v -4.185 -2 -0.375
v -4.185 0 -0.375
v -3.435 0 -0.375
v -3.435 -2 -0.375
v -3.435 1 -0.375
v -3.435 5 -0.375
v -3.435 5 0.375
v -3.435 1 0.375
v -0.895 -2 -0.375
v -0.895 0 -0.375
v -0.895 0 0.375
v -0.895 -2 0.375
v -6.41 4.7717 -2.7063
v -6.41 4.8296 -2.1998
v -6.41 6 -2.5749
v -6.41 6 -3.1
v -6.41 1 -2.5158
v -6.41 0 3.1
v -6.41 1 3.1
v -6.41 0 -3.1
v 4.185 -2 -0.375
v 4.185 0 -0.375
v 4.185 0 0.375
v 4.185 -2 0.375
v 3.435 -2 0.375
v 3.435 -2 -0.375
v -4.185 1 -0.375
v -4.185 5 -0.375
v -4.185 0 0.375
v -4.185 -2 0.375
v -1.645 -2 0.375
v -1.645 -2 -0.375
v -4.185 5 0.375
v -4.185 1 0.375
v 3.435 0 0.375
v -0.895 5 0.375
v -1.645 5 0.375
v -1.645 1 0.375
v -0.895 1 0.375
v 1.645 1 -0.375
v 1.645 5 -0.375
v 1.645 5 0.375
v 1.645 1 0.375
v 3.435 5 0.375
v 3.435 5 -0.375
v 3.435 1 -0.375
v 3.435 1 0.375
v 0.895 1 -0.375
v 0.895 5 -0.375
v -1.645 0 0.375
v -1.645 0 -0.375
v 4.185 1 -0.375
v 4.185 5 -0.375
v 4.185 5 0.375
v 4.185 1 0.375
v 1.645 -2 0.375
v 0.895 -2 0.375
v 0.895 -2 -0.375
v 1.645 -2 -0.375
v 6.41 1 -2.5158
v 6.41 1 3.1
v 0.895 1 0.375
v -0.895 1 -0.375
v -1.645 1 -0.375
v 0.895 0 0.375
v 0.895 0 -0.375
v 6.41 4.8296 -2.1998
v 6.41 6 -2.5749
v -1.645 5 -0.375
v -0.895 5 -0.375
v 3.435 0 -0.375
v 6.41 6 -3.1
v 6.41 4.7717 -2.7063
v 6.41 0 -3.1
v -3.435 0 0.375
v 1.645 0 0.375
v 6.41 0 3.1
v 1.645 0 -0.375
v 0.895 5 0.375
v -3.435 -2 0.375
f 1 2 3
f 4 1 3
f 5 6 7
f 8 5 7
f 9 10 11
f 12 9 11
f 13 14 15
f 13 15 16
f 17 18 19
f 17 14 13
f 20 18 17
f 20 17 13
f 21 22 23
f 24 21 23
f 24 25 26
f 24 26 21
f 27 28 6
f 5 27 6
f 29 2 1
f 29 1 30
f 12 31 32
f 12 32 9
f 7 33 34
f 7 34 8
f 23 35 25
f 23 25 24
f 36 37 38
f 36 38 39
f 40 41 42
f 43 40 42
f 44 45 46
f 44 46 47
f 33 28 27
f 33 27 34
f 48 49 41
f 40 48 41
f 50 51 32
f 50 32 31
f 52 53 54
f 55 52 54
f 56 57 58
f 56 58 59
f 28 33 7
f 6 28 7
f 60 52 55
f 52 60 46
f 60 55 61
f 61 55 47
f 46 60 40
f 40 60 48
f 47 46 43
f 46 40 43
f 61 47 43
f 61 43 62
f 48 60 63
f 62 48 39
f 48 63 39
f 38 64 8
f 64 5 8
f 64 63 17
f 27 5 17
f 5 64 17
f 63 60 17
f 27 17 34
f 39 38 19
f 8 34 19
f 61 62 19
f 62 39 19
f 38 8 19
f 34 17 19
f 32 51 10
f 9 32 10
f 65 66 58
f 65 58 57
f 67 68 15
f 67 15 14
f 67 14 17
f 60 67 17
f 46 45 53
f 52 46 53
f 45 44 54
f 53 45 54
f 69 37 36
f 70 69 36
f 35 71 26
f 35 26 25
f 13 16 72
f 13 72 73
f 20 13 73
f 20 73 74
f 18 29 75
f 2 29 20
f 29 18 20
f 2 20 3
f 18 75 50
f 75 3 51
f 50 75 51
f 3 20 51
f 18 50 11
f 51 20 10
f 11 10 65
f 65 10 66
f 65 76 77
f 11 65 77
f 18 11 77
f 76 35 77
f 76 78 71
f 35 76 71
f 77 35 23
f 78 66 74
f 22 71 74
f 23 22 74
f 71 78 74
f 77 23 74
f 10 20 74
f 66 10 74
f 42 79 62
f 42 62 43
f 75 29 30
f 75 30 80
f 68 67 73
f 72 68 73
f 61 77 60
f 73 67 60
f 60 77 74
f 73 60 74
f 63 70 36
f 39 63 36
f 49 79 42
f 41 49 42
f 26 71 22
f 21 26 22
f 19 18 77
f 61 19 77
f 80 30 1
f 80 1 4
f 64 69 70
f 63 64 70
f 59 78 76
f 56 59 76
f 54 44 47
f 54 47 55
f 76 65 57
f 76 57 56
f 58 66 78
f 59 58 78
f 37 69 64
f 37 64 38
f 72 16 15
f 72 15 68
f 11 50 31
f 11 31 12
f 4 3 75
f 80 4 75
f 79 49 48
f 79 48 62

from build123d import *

# Parameters (mm, degrees)
SKETCH_1_W           = 12.82
SKETCH_1_H           = 6.2
EXTRUDE_1_DEPTH      = 6
SKETCH_2_W           = 12.82
SKETCH_2_H           = 5.2
CUT_EXTRUDE_1_DEPTH  = 5
CUT_EXTRUDE_2_DEPTH  = 15.490079365
CUT_EXTRUDE_3_DEPTH  = 15.490079365
EXTRUDE_2_DEPTH      = 2
EXTRUDE_2_DEPTH_BACK = 5
SKETCH_4_W           = 0.75
SKETCH_4_H           = 0.75


with BuildPart() as part:
    # 草图1 → 拉伸1 (new body)
    with BuildSketch(Plane(origin=(0, 0, 0), x_dir=(1, 0, 0), z_dir=(0, 1, 0))):
        Rectangle(SKETCH_1_W, SKETCH_1_H)
    extrude(amount=EXTRUDE_1_DEPTH)

    # 草图2 → 切除-拉伸1 (cut)
    with BuildSketch(Plane(origin=(0, 6, 0), x_dir=(-1, 0, 0), z_dir=(0, 1, 0))):
        with Locations((0, 0.5)):
            Rectangle(SKETCH_2_W, SKETCH_2_H)
    extrude(amount=-CUT_EXTRUDE_1_DEPTH, mode=Mode.SUBTRACT)

    # 草图5 → 切除-拉伸2 (cut, through all)
    with BuildSketch(Plane.ZY.offset(6.41)):
        Polygon((-3.1, 6), (-2.706299213, 4.771653543), (-3.1, 0), align=None)
    extrude(amount=-CUT_EXTRUDE_2_DEPTH, mode=Mode.SUBTRACT)

    # 草图6 → 切除-拉伸3 (cut, through all)
    with BuildSketch(Plane.ZY.offset(6.41)):
        Polygon((-2.1, 1), (-2.1, 6), (-2.574945606, 6), (-2.19981878, 4.829604305), (-2.515792733, 1), align=None)
    extrude(amount=-CUT_EXTRUDE_3_DEPTH, mode=Mode.SUBTRACT)

    # 草图4 → 拉伸2 (add, two sides: drawn at the far end of the back side and taken through both)
    with BuildSketch(Plane.XZ.offset(-EXTRUDE_2_DEPTH_BACK)):
        with Locations((-1.27, 0)):
            Rectangle(SKETCH_4_W, SKETCH_4_H)
        with Locations((1.27, 0)):
            Rectangle(SKETCH_4_W, SKETCH_4_H)
        with Locations((3.81, 0)):
            Rectangle(SKETCH_4_W, SKETCH_4_H)
        with Locations((-3.81, 0)):
            Rectangle(SKETCH_4_W, SKETCH_4_H)
    extrude(amount=EXTRUDE_2_DEPTH + EXTRUDE_2_DEPTH_BACK)


solid = part.part
